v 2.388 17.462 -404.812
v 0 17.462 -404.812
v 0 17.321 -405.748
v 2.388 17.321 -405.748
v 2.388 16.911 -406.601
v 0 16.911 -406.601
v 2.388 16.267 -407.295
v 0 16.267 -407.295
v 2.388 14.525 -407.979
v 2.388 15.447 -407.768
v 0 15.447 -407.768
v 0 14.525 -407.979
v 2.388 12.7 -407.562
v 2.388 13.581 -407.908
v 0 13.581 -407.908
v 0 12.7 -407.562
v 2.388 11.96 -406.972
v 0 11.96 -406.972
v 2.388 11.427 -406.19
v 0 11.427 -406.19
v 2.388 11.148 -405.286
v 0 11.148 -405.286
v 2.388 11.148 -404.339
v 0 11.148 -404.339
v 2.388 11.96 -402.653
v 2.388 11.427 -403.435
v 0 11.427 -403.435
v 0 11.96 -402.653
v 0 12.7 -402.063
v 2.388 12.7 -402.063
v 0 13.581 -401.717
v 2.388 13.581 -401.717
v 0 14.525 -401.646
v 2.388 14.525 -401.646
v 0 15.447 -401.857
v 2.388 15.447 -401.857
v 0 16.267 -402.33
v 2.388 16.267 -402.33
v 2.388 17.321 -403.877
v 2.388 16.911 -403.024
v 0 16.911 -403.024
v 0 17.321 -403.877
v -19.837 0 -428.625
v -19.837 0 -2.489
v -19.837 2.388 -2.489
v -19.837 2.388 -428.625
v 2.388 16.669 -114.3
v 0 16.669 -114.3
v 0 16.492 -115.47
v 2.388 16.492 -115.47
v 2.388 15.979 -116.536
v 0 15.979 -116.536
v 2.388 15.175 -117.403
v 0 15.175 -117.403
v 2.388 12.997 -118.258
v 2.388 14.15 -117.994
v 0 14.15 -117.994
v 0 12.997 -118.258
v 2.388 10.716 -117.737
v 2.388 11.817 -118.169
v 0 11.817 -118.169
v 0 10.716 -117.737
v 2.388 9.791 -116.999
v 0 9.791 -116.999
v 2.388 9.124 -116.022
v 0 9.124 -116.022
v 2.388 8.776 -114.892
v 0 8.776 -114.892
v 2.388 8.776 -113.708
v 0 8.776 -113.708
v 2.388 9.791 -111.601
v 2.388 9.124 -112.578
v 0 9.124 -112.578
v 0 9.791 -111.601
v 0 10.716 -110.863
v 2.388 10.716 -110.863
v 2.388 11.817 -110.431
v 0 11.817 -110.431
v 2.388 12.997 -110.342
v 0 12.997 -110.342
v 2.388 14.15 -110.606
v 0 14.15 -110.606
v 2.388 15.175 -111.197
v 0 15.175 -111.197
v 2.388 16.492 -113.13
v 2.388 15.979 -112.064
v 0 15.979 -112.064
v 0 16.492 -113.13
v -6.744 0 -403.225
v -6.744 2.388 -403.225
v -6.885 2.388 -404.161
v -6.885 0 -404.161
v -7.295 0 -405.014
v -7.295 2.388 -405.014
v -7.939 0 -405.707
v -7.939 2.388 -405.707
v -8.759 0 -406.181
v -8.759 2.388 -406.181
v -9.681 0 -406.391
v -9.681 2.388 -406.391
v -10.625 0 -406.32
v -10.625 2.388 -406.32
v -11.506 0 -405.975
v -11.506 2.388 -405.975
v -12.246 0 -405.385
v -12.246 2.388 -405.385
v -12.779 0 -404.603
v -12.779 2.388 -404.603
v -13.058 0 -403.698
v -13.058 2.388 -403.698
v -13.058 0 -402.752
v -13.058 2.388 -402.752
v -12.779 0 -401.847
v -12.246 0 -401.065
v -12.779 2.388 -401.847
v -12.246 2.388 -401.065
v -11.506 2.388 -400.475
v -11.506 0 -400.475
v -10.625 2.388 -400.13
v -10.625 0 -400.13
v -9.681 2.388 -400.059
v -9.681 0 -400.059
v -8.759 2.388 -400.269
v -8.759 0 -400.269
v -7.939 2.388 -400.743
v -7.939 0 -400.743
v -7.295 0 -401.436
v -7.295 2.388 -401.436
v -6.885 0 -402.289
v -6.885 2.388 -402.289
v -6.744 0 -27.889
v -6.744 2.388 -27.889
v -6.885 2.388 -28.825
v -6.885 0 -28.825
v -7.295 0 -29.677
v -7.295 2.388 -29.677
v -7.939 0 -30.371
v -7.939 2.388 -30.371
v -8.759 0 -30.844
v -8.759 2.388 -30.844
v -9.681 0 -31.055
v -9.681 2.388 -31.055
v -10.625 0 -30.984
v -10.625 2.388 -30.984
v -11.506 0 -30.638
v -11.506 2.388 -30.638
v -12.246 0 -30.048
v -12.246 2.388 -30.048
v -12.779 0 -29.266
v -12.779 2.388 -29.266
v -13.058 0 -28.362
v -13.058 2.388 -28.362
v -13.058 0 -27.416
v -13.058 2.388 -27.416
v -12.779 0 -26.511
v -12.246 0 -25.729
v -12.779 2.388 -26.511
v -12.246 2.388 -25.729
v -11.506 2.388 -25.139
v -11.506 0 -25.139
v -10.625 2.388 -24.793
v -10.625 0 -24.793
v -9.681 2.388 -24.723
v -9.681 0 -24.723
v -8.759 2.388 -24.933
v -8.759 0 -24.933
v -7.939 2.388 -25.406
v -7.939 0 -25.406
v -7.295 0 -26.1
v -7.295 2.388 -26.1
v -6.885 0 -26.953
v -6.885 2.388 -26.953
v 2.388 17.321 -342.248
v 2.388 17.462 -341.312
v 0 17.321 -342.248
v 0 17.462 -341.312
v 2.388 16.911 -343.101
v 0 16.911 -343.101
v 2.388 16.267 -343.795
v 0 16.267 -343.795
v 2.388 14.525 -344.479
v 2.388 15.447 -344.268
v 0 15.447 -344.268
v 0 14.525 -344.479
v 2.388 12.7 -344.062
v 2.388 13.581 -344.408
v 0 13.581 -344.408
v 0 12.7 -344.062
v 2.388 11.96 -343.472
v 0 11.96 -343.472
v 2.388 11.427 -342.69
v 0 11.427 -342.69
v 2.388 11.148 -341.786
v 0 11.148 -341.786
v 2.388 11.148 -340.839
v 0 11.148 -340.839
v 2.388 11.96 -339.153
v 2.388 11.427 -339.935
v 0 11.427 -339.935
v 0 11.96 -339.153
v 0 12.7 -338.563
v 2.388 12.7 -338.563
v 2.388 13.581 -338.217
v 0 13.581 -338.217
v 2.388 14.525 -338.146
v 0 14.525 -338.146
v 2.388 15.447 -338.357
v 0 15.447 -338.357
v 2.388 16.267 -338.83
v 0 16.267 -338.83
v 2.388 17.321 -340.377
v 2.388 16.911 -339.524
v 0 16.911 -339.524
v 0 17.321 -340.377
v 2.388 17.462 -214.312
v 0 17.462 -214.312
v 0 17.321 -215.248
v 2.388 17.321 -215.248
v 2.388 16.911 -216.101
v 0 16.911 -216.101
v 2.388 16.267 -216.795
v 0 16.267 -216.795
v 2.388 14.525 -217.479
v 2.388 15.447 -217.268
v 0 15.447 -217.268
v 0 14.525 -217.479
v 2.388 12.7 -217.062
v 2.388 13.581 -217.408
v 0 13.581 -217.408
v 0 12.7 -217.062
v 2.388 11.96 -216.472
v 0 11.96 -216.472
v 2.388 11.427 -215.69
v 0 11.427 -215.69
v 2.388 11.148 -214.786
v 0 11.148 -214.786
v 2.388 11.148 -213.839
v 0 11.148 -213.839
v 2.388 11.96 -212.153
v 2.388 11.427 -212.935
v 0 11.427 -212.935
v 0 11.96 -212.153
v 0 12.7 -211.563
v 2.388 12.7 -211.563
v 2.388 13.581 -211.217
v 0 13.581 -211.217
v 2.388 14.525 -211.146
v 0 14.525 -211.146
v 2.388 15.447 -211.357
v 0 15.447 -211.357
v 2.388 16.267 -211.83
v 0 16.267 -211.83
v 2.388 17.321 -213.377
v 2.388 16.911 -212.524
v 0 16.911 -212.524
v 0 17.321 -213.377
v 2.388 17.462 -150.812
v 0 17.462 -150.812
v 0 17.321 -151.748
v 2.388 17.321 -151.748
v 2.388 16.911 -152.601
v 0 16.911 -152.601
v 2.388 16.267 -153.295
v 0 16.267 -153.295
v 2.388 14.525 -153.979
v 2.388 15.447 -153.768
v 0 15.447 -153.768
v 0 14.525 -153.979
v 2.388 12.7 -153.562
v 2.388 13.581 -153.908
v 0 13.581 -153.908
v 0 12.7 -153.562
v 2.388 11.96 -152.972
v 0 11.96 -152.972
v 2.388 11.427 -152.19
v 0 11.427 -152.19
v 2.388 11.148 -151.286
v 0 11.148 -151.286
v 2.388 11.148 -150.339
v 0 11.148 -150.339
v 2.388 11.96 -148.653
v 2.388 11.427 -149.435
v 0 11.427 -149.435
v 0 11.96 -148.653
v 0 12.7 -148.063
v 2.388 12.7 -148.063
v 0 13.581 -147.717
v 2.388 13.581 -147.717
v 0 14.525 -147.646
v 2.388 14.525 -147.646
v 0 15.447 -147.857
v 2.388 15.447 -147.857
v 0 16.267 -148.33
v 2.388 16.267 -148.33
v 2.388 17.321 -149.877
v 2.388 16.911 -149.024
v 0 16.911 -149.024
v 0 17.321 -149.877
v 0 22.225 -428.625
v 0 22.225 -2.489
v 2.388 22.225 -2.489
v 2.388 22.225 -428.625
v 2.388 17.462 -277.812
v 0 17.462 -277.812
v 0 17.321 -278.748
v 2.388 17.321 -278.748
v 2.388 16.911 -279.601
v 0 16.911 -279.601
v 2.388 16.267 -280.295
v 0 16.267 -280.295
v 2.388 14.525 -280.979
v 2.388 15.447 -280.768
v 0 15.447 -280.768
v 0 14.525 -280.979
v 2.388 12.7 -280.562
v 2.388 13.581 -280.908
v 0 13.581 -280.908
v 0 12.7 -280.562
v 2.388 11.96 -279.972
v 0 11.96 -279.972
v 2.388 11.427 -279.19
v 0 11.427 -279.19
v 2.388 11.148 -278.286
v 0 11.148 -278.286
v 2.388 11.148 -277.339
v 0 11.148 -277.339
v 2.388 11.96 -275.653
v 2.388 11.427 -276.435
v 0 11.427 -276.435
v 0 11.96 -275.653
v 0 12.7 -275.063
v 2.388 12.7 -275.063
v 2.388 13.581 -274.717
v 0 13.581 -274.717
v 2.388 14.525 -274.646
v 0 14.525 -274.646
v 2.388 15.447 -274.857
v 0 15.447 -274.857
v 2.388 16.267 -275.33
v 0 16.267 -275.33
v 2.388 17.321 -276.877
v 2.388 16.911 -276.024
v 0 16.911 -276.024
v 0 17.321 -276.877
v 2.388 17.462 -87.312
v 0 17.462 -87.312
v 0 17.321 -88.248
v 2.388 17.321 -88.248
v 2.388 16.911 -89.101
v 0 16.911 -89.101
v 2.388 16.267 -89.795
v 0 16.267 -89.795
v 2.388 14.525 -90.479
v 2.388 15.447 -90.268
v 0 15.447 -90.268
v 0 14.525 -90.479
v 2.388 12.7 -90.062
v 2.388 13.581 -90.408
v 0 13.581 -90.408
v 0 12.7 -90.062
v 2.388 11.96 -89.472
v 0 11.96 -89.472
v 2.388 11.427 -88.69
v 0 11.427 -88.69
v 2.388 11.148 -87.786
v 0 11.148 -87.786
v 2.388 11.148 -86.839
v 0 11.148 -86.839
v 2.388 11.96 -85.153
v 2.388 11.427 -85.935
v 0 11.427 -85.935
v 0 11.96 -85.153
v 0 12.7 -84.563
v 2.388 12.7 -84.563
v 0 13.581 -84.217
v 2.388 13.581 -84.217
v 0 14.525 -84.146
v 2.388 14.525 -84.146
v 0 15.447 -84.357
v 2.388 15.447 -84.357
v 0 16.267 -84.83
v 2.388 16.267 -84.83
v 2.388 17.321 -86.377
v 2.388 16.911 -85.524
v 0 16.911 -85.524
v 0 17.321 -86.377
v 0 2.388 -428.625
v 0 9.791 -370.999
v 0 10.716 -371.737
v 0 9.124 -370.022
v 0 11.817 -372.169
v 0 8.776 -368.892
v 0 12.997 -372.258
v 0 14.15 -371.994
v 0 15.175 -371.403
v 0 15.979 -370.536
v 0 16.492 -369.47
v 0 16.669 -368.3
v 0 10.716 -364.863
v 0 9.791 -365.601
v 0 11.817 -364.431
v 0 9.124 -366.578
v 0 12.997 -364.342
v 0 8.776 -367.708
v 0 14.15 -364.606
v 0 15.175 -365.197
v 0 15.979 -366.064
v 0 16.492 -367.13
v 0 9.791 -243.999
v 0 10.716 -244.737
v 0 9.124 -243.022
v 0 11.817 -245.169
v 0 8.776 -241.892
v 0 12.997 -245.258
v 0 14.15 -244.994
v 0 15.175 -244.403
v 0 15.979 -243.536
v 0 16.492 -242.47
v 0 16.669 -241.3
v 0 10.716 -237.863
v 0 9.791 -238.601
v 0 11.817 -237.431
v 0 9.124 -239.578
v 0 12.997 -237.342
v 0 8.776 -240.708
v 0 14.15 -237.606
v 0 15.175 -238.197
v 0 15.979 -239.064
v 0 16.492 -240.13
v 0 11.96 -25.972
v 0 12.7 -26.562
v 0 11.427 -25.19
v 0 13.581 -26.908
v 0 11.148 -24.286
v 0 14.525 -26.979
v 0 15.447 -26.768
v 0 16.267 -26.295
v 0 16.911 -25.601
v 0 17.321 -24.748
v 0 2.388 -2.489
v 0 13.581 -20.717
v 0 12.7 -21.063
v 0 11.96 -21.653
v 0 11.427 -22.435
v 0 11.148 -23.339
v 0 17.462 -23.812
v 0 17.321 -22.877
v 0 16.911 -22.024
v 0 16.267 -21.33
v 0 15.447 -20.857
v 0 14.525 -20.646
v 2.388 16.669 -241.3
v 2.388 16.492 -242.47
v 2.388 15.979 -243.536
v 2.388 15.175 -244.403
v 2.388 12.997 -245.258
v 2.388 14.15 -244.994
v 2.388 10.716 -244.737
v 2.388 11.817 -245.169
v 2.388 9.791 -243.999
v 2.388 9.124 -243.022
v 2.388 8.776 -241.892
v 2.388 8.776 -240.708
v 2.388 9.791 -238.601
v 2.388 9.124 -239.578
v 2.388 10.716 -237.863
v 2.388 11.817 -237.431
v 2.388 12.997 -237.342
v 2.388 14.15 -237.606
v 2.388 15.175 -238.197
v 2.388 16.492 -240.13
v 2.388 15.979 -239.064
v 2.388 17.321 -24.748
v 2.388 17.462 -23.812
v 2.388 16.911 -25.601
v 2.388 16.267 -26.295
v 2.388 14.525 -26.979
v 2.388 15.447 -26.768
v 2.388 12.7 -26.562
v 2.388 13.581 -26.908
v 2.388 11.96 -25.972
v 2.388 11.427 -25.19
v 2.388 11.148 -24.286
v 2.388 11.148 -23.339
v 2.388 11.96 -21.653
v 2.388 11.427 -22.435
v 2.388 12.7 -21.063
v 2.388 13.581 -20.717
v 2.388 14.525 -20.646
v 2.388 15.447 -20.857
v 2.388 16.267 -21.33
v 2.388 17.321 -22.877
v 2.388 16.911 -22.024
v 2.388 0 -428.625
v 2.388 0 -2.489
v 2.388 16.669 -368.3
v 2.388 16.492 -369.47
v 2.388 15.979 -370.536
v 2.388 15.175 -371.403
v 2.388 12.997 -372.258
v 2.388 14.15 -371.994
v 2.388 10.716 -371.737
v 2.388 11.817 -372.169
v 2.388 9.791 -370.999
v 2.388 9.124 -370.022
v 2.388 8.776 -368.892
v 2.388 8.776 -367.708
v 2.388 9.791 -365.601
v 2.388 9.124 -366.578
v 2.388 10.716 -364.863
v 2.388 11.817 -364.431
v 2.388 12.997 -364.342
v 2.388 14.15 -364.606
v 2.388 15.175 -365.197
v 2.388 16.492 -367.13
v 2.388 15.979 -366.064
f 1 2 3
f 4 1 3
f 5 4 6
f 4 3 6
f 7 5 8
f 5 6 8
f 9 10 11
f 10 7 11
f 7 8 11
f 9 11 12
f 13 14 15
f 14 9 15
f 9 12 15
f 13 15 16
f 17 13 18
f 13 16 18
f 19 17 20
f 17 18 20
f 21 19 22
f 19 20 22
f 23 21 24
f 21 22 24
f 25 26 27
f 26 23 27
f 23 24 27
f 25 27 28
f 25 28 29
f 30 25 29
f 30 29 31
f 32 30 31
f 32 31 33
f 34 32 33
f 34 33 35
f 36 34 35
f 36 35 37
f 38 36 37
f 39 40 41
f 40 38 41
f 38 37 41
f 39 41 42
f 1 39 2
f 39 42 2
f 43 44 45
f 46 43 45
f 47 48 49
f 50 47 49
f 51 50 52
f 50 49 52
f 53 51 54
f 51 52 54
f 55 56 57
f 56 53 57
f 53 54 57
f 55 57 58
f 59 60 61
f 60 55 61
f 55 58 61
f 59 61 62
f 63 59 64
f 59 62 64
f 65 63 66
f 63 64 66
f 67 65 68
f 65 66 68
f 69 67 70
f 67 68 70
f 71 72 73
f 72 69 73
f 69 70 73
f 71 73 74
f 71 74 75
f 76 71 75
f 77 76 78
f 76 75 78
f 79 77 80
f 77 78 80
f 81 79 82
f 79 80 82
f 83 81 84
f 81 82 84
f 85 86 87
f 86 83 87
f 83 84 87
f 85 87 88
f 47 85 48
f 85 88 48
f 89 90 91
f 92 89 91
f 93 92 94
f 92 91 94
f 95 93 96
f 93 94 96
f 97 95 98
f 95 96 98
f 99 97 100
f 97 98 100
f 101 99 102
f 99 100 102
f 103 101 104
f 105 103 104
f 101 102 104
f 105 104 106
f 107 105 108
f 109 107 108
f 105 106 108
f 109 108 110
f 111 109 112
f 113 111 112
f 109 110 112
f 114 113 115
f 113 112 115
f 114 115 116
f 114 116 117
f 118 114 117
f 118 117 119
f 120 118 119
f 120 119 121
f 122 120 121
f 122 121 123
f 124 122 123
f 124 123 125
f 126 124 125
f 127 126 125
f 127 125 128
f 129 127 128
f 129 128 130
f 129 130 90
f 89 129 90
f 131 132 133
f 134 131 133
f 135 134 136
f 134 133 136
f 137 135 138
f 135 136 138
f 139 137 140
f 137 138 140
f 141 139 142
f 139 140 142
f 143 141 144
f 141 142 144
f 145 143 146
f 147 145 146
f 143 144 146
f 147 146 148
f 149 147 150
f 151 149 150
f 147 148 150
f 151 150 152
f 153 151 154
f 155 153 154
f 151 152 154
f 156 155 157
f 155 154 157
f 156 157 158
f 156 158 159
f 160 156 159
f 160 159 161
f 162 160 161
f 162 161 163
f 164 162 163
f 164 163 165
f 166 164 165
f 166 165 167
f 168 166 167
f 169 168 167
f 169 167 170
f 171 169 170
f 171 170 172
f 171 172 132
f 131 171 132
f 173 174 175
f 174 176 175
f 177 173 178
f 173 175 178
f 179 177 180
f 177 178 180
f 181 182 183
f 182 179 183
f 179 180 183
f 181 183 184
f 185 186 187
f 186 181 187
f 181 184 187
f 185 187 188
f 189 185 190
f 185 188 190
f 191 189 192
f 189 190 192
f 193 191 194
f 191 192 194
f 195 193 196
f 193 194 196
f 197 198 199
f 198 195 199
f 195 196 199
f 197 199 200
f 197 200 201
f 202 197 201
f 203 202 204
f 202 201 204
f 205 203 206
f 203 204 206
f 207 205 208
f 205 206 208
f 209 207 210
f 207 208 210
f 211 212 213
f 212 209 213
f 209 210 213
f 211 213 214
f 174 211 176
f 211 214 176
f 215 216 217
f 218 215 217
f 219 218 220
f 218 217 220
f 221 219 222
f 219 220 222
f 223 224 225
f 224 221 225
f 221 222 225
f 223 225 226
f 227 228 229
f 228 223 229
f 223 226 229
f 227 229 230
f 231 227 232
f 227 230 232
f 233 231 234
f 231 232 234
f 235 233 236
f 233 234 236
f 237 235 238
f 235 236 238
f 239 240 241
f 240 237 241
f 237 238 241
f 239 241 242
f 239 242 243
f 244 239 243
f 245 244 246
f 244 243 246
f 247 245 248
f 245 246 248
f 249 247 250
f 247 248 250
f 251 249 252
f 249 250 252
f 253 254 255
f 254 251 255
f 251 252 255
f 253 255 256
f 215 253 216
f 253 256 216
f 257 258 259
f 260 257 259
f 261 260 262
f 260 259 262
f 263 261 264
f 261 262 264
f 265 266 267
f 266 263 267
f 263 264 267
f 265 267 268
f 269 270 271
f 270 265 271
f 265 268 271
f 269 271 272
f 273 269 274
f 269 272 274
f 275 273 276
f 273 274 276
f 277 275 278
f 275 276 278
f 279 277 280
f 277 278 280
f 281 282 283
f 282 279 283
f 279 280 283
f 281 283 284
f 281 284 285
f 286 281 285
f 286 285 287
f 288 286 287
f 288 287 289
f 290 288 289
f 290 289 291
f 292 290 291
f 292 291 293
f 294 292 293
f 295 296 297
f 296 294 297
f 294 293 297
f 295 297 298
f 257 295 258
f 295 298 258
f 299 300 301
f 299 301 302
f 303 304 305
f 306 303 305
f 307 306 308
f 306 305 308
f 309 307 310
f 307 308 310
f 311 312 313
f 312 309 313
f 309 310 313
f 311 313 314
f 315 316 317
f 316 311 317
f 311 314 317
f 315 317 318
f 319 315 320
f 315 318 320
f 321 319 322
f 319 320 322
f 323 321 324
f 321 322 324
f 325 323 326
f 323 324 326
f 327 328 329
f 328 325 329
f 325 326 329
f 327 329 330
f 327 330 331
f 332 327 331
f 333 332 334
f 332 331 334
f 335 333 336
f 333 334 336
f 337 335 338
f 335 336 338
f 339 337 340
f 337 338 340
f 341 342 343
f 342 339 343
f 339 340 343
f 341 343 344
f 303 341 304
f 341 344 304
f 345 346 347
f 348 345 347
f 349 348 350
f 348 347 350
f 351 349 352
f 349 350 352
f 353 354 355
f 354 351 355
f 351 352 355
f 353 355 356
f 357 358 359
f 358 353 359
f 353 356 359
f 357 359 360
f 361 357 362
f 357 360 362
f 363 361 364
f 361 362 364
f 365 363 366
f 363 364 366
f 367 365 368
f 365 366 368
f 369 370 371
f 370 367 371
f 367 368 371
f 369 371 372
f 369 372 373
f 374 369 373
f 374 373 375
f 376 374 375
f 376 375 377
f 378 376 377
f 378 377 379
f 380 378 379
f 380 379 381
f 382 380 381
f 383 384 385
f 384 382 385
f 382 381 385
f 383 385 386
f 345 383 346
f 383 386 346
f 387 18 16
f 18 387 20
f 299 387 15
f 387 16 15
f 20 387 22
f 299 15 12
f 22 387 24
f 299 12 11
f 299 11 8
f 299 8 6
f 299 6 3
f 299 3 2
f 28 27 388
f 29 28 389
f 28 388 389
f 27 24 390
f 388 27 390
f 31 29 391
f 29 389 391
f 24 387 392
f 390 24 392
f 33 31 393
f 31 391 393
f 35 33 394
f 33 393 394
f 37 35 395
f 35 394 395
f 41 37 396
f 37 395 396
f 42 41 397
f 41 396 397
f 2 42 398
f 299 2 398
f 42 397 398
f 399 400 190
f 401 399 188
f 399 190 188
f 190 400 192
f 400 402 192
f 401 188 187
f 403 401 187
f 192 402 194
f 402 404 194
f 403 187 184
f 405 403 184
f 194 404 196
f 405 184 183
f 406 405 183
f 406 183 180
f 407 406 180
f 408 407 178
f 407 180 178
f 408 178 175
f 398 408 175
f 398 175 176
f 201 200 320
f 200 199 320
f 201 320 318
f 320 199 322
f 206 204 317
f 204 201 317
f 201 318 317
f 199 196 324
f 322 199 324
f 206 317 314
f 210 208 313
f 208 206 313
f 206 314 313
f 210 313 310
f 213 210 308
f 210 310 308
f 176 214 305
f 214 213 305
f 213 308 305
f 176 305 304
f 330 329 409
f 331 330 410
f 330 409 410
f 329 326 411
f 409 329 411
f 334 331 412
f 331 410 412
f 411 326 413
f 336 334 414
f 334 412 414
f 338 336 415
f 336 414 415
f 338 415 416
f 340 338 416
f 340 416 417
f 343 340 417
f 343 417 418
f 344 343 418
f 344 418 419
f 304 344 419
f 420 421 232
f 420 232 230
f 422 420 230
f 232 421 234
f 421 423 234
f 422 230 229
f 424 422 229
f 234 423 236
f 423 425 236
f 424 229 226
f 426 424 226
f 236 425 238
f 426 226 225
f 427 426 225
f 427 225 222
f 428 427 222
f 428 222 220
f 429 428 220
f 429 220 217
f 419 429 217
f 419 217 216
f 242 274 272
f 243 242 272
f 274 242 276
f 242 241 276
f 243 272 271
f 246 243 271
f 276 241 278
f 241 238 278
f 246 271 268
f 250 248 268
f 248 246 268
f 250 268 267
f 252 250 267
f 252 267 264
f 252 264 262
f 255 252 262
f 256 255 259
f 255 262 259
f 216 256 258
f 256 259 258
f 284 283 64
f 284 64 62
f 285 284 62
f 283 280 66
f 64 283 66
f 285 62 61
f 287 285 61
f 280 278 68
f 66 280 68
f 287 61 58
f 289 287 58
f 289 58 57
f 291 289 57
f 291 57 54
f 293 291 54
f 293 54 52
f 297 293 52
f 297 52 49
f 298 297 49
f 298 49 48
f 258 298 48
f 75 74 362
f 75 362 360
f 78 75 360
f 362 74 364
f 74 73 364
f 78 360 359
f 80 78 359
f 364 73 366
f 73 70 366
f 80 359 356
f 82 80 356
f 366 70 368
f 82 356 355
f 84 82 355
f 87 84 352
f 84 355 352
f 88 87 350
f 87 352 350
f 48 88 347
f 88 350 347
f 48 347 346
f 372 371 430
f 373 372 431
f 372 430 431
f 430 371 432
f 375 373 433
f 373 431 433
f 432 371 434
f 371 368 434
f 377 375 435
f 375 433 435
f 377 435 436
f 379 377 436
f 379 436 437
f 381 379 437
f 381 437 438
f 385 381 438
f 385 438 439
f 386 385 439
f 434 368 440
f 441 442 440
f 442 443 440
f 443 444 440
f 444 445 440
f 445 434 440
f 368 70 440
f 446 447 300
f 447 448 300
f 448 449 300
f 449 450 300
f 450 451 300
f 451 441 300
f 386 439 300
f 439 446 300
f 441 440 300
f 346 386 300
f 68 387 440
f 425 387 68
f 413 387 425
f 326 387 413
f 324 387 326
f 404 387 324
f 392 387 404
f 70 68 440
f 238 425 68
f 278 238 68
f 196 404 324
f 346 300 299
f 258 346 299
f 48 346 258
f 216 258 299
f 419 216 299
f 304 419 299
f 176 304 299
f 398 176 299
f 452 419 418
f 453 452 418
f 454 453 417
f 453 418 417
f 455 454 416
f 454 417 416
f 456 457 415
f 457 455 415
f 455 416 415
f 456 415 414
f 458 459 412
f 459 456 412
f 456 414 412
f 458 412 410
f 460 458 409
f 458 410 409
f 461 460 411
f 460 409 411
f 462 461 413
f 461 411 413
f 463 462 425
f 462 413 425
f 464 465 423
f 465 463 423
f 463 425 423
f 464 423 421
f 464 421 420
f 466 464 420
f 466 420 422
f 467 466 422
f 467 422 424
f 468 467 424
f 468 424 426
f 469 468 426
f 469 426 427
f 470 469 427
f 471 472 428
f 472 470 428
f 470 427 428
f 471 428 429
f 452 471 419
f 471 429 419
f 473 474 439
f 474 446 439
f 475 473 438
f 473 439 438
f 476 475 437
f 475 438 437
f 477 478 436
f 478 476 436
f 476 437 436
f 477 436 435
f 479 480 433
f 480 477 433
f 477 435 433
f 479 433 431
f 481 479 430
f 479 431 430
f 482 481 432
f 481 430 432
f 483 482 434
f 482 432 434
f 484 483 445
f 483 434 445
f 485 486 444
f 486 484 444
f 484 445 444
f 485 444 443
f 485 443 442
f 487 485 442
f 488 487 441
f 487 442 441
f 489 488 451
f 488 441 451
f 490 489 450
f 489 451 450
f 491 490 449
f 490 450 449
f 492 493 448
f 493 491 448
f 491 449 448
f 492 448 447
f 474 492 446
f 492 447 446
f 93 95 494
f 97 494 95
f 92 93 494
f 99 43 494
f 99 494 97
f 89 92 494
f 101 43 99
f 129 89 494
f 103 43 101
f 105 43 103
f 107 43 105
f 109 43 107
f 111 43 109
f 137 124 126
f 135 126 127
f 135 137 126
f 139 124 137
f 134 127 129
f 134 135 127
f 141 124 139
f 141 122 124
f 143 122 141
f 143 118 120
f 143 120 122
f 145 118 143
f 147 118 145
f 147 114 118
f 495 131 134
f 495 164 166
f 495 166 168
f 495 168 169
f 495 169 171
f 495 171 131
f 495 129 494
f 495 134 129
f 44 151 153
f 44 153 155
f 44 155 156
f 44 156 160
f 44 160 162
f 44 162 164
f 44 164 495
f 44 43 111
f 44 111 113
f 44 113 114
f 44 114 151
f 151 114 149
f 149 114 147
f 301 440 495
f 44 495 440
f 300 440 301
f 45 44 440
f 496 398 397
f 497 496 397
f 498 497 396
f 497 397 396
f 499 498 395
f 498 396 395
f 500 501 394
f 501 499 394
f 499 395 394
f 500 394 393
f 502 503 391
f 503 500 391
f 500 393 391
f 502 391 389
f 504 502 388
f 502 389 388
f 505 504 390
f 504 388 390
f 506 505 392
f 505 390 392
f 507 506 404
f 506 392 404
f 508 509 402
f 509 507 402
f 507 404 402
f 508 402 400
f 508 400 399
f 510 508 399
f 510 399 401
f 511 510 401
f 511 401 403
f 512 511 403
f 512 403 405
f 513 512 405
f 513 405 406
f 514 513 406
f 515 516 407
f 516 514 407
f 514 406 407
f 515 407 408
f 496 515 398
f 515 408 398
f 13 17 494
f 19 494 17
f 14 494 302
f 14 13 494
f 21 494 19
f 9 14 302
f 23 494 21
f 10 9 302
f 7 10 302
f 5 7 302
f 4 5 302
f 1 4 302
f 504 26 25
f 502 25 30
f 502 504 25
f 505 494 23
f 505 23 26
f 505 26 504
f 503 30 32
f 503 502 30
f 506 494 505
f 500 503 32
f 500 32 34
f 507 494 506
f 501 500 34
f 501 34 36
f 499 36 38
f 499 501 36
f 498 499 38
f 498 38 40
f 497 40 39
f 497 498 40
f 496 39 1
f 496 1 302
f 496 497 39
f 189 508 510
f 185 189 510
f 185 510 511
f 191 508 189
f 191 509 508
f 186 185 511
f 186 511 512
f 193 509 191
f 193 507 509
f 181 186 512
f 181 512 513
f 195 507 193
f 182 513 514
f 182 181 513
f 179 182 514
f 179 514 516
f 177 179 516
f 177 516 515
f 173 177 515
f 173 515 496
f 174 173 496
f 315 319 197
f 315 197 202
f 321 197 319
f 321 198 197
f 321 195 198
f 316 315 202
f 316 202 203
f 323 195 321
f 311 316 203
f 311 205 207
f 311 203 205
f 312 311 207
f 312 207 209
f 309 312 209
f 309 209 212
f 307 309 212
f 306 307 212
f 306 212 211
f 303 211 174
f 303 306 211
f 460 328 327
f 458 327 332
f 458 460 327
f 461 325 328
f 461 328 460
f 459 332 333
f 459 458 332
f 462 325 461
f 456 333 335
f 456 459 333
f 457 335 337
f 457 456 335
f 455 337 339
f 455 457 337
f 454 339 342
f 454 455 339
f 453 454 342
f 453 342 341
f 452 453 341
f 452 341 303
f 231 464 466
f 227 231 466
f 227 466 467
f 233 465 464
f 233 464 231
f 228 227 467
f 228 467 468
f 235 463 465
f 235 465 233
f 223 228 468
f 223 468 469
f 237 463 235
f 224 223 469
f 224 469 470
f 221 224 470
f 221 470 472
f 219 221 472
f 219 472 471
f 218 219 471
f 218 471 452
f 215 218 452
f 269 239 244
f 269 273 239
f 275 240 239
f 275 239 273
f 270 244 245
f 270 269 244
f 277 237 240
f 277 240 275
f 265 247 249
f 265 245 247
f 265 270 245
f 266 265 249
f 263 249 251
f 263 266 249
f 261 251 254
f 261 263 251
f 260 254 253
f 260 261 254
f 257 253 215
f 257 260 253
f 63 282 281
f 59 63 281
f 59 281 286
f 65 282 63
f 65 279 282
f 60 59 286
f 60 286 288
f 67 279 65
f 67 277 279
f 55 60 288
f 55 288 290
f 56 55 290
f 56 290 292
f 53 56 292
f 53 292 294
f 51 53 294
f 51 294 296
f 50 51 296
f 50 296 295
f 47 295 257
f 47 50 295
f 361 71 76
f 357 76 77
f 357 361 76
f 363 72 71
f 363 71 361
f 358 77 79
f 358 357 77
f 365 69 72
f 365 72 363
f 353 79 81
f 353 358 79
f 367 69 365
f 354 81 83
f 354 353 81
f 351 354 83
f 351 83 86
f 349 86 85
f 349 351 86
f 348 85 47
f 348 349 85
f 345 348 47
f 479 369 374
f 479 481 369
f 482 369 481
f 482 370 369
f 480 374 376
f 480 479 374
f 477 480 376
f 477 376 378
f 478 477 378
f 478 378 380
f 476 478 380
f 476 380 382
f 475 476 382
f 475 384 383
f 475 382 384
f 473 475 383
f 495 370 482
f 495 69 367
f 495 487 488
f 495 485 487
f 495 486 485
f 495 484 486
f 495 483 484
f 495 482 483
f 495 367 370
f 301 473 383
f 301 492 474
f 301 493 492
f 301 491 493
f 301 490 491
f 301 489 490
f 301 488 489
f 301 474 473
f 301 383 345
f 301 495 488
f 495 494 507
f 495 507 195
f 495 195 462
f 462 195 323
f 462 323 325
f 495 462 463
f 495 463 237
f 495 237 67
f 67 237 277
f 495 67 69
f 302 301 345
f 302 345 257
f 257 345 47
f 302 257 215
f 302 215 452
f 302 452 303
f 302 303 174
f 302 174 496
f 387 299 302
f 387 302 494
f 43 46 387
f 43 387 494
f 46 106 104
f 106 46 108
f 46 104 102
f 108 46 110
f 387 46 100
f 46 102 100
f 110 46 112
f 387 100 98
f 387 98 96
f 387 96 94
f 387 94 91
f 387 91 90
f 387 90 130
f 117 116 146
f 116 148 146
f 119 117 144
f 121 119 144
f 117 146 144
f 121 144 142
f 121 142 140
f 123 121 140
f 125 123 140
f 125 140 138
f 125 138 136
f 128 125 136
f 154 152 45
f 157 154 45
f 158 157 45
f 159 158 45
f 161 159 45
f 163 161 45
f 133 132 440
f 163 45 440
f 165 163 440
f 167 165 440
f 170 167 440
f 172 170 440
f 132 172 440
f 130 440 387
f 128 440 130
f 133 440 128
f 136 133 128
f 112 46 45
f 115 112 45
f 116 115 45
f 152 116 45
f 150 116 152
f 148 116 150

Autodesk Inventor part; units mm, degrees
ref_plane "YZ Plane" through (0, 0, 0) normal (1, 0, 0) x (0, 1, 0)
ref_plane "XZ Plane" through (0, 0, 0) normal (0, 1, 0) x (-1, 0, 0)
ref_plane "XY Plane" through (0, 0, 0) normal (0, 0, 1) x (1, 0, 0)
sketch "Sketch1" plane through (0, 0, 0) normal (1, 0, 0) x (0, 1, 0)
  line L0 (0, 0) -> (203.2, 0) construction
  line L1 (203.2, 0) -> (203.2, 25.4) construction
  line L2 (203.2, 25.4) -> (0, 25.4) construction
  line L3 (0, 25.4) -> (0, 0) construction
  line L4 (0, 0) -> (25.4, 0) construction
  line L5 (25.4, 0) -> (25.4, -609.6) construction
  line L6 (25.4, -609.6) -> (0, -609.6) construction
  line L7 (0, -609.6) -> (0, 0) construction
  circle A0 centre (14.2875, -23.8125) radius 11.1125 construction
  line L8 (-1.5875, -12.7) -> (150.8125, -12.7) construction
  line L9 (114.3, -12.7) -> (25.4, -12.7) construction
  line L10 (25.4, -12.7) -> (25.4, -419.1) construction
  line L11 (25.4, -419.1) -> (114.3, -419.1) construction
  line L12 (114.3, -419.1) -> (114.3, -12.7) construction
  circle A1 centre (14.2875, -23.8125) radius 7.9375 construction
  circle A2 centre (14.2875, -23.8125) radius 3.175
  circle A3 centre (12.7, -114.3) radius 3.9688
  circle A4 centre (12.7, -241.3) radius 3.9688
  circle A5 centre (12.7, -368.3) radius 3.9688
  circle A6 centre (12.7, -495.3) radius 3.9688 construction
  circle A7 centre (14.2875, -87.3125) radius 3.175
  circle A8 centre (14.2875, -87.3125) radius 11.1125 construction
  circle A9 centre (14.2875, -150.8125) radius 3.175
  circle A10 centre (14.2875, -150.8125) radius 11.1125 construction
  circle A11 centre (14.2875, -214.3125) radius 3.175
  circle A12 centre (14.2875, -214.3125) radius 11.1125 construction
  circle A13 centre (14.2875, -277.8125) radius 3.175
  circle A14 centre (14.2875, -277.8125) radius 11.1125 construction
  circle A15 centre (14.2875, -341.3125) radius 3.175
  circle A16 centre (14.2875, -341.3125) radius 11.1125 construction
  circle A17 centre (14.2875, -404.8125) radius 3.175
  circle A18 centre (14.2875, -404.8125) radius 11.1125 construction
  line L13 (0, -2.4888) -> (22.225, -2.4888)
  line L14 (22.225, -2.4888) -> (22.225, -428.625)
  line L15 (22.225, -428.625) -> (0, -428.625)
  line L16 (0, -428.625) -> (0, -2.4888)
  dimension "d0" = 203.2
  dimension "d1" = 25.4
  dimension "d2" = 25.4
  dimension "d3" = 609.6
  dimension "d4" = 12.7
  dimension "d6" = 22.225
  dimension "d7" = 406.4
  dimension "d8" = 88.9
  dimension "d10" = 15.875
  dimension "d11" = 6.35
  dimension "d12" = 7.9375
  dimension "d13" = 12.7
  dimension "d14" = 114.3
  dimension "d17" = 127
  dimension "d24" = 63.5
  dimension "d29" = 22.225
extrude "Extrusion1" add sketch "Sketch1" along normal blind 2.3876
sketch "Sketch2" plane through (0, 0, -2.4888) normal (0, 0, 1) x (1, 0, 0)
  line L0 (0, 0) -> (-19.8374, 0)
  line L1 (-19.8374, 0) -> (-19.8374, 2.3876)
  line L2 (-19.8374, 2.3876) -> (0, 2.3876)
  line L3 (0, 2.3876) -> (0, 0)
  dimension "d32" = 19.8374
  dimension "d33" = 2.3876
extrude "Extrusion2" add sketch "Sketch2" against normal up to surface (426.1362 mm away)
sketch "Sketch3" plane through (-19.8374, 2.3876, -2.4888) normal (0, 1, 0) x (1, 0, 0)
  circle A0 centre (9.9187, 25.4) radius 3.175
  line L0 (19.8374, 0) -> (0, 0) projected
  line L1 (9.9187, 0) -> (9.9187, 25.4) construction
  circle A1 centre (9.9187, 400.7362) radius 3.175
  line L2 (19.8374, 426.1362) -> (0, 426.1362) construction
  point P0 (19.8374, -2.4888)
  dimension "d36" = 6.35
  dimension "d37" = 25.4
  dimension "d38" = 6.35
  dimension "d39" = 25.4
extrude "Extrusion3" cut sketch "Sketch3" against normal through all
properties part number "BatteryDrawer_AngleBrackets"
